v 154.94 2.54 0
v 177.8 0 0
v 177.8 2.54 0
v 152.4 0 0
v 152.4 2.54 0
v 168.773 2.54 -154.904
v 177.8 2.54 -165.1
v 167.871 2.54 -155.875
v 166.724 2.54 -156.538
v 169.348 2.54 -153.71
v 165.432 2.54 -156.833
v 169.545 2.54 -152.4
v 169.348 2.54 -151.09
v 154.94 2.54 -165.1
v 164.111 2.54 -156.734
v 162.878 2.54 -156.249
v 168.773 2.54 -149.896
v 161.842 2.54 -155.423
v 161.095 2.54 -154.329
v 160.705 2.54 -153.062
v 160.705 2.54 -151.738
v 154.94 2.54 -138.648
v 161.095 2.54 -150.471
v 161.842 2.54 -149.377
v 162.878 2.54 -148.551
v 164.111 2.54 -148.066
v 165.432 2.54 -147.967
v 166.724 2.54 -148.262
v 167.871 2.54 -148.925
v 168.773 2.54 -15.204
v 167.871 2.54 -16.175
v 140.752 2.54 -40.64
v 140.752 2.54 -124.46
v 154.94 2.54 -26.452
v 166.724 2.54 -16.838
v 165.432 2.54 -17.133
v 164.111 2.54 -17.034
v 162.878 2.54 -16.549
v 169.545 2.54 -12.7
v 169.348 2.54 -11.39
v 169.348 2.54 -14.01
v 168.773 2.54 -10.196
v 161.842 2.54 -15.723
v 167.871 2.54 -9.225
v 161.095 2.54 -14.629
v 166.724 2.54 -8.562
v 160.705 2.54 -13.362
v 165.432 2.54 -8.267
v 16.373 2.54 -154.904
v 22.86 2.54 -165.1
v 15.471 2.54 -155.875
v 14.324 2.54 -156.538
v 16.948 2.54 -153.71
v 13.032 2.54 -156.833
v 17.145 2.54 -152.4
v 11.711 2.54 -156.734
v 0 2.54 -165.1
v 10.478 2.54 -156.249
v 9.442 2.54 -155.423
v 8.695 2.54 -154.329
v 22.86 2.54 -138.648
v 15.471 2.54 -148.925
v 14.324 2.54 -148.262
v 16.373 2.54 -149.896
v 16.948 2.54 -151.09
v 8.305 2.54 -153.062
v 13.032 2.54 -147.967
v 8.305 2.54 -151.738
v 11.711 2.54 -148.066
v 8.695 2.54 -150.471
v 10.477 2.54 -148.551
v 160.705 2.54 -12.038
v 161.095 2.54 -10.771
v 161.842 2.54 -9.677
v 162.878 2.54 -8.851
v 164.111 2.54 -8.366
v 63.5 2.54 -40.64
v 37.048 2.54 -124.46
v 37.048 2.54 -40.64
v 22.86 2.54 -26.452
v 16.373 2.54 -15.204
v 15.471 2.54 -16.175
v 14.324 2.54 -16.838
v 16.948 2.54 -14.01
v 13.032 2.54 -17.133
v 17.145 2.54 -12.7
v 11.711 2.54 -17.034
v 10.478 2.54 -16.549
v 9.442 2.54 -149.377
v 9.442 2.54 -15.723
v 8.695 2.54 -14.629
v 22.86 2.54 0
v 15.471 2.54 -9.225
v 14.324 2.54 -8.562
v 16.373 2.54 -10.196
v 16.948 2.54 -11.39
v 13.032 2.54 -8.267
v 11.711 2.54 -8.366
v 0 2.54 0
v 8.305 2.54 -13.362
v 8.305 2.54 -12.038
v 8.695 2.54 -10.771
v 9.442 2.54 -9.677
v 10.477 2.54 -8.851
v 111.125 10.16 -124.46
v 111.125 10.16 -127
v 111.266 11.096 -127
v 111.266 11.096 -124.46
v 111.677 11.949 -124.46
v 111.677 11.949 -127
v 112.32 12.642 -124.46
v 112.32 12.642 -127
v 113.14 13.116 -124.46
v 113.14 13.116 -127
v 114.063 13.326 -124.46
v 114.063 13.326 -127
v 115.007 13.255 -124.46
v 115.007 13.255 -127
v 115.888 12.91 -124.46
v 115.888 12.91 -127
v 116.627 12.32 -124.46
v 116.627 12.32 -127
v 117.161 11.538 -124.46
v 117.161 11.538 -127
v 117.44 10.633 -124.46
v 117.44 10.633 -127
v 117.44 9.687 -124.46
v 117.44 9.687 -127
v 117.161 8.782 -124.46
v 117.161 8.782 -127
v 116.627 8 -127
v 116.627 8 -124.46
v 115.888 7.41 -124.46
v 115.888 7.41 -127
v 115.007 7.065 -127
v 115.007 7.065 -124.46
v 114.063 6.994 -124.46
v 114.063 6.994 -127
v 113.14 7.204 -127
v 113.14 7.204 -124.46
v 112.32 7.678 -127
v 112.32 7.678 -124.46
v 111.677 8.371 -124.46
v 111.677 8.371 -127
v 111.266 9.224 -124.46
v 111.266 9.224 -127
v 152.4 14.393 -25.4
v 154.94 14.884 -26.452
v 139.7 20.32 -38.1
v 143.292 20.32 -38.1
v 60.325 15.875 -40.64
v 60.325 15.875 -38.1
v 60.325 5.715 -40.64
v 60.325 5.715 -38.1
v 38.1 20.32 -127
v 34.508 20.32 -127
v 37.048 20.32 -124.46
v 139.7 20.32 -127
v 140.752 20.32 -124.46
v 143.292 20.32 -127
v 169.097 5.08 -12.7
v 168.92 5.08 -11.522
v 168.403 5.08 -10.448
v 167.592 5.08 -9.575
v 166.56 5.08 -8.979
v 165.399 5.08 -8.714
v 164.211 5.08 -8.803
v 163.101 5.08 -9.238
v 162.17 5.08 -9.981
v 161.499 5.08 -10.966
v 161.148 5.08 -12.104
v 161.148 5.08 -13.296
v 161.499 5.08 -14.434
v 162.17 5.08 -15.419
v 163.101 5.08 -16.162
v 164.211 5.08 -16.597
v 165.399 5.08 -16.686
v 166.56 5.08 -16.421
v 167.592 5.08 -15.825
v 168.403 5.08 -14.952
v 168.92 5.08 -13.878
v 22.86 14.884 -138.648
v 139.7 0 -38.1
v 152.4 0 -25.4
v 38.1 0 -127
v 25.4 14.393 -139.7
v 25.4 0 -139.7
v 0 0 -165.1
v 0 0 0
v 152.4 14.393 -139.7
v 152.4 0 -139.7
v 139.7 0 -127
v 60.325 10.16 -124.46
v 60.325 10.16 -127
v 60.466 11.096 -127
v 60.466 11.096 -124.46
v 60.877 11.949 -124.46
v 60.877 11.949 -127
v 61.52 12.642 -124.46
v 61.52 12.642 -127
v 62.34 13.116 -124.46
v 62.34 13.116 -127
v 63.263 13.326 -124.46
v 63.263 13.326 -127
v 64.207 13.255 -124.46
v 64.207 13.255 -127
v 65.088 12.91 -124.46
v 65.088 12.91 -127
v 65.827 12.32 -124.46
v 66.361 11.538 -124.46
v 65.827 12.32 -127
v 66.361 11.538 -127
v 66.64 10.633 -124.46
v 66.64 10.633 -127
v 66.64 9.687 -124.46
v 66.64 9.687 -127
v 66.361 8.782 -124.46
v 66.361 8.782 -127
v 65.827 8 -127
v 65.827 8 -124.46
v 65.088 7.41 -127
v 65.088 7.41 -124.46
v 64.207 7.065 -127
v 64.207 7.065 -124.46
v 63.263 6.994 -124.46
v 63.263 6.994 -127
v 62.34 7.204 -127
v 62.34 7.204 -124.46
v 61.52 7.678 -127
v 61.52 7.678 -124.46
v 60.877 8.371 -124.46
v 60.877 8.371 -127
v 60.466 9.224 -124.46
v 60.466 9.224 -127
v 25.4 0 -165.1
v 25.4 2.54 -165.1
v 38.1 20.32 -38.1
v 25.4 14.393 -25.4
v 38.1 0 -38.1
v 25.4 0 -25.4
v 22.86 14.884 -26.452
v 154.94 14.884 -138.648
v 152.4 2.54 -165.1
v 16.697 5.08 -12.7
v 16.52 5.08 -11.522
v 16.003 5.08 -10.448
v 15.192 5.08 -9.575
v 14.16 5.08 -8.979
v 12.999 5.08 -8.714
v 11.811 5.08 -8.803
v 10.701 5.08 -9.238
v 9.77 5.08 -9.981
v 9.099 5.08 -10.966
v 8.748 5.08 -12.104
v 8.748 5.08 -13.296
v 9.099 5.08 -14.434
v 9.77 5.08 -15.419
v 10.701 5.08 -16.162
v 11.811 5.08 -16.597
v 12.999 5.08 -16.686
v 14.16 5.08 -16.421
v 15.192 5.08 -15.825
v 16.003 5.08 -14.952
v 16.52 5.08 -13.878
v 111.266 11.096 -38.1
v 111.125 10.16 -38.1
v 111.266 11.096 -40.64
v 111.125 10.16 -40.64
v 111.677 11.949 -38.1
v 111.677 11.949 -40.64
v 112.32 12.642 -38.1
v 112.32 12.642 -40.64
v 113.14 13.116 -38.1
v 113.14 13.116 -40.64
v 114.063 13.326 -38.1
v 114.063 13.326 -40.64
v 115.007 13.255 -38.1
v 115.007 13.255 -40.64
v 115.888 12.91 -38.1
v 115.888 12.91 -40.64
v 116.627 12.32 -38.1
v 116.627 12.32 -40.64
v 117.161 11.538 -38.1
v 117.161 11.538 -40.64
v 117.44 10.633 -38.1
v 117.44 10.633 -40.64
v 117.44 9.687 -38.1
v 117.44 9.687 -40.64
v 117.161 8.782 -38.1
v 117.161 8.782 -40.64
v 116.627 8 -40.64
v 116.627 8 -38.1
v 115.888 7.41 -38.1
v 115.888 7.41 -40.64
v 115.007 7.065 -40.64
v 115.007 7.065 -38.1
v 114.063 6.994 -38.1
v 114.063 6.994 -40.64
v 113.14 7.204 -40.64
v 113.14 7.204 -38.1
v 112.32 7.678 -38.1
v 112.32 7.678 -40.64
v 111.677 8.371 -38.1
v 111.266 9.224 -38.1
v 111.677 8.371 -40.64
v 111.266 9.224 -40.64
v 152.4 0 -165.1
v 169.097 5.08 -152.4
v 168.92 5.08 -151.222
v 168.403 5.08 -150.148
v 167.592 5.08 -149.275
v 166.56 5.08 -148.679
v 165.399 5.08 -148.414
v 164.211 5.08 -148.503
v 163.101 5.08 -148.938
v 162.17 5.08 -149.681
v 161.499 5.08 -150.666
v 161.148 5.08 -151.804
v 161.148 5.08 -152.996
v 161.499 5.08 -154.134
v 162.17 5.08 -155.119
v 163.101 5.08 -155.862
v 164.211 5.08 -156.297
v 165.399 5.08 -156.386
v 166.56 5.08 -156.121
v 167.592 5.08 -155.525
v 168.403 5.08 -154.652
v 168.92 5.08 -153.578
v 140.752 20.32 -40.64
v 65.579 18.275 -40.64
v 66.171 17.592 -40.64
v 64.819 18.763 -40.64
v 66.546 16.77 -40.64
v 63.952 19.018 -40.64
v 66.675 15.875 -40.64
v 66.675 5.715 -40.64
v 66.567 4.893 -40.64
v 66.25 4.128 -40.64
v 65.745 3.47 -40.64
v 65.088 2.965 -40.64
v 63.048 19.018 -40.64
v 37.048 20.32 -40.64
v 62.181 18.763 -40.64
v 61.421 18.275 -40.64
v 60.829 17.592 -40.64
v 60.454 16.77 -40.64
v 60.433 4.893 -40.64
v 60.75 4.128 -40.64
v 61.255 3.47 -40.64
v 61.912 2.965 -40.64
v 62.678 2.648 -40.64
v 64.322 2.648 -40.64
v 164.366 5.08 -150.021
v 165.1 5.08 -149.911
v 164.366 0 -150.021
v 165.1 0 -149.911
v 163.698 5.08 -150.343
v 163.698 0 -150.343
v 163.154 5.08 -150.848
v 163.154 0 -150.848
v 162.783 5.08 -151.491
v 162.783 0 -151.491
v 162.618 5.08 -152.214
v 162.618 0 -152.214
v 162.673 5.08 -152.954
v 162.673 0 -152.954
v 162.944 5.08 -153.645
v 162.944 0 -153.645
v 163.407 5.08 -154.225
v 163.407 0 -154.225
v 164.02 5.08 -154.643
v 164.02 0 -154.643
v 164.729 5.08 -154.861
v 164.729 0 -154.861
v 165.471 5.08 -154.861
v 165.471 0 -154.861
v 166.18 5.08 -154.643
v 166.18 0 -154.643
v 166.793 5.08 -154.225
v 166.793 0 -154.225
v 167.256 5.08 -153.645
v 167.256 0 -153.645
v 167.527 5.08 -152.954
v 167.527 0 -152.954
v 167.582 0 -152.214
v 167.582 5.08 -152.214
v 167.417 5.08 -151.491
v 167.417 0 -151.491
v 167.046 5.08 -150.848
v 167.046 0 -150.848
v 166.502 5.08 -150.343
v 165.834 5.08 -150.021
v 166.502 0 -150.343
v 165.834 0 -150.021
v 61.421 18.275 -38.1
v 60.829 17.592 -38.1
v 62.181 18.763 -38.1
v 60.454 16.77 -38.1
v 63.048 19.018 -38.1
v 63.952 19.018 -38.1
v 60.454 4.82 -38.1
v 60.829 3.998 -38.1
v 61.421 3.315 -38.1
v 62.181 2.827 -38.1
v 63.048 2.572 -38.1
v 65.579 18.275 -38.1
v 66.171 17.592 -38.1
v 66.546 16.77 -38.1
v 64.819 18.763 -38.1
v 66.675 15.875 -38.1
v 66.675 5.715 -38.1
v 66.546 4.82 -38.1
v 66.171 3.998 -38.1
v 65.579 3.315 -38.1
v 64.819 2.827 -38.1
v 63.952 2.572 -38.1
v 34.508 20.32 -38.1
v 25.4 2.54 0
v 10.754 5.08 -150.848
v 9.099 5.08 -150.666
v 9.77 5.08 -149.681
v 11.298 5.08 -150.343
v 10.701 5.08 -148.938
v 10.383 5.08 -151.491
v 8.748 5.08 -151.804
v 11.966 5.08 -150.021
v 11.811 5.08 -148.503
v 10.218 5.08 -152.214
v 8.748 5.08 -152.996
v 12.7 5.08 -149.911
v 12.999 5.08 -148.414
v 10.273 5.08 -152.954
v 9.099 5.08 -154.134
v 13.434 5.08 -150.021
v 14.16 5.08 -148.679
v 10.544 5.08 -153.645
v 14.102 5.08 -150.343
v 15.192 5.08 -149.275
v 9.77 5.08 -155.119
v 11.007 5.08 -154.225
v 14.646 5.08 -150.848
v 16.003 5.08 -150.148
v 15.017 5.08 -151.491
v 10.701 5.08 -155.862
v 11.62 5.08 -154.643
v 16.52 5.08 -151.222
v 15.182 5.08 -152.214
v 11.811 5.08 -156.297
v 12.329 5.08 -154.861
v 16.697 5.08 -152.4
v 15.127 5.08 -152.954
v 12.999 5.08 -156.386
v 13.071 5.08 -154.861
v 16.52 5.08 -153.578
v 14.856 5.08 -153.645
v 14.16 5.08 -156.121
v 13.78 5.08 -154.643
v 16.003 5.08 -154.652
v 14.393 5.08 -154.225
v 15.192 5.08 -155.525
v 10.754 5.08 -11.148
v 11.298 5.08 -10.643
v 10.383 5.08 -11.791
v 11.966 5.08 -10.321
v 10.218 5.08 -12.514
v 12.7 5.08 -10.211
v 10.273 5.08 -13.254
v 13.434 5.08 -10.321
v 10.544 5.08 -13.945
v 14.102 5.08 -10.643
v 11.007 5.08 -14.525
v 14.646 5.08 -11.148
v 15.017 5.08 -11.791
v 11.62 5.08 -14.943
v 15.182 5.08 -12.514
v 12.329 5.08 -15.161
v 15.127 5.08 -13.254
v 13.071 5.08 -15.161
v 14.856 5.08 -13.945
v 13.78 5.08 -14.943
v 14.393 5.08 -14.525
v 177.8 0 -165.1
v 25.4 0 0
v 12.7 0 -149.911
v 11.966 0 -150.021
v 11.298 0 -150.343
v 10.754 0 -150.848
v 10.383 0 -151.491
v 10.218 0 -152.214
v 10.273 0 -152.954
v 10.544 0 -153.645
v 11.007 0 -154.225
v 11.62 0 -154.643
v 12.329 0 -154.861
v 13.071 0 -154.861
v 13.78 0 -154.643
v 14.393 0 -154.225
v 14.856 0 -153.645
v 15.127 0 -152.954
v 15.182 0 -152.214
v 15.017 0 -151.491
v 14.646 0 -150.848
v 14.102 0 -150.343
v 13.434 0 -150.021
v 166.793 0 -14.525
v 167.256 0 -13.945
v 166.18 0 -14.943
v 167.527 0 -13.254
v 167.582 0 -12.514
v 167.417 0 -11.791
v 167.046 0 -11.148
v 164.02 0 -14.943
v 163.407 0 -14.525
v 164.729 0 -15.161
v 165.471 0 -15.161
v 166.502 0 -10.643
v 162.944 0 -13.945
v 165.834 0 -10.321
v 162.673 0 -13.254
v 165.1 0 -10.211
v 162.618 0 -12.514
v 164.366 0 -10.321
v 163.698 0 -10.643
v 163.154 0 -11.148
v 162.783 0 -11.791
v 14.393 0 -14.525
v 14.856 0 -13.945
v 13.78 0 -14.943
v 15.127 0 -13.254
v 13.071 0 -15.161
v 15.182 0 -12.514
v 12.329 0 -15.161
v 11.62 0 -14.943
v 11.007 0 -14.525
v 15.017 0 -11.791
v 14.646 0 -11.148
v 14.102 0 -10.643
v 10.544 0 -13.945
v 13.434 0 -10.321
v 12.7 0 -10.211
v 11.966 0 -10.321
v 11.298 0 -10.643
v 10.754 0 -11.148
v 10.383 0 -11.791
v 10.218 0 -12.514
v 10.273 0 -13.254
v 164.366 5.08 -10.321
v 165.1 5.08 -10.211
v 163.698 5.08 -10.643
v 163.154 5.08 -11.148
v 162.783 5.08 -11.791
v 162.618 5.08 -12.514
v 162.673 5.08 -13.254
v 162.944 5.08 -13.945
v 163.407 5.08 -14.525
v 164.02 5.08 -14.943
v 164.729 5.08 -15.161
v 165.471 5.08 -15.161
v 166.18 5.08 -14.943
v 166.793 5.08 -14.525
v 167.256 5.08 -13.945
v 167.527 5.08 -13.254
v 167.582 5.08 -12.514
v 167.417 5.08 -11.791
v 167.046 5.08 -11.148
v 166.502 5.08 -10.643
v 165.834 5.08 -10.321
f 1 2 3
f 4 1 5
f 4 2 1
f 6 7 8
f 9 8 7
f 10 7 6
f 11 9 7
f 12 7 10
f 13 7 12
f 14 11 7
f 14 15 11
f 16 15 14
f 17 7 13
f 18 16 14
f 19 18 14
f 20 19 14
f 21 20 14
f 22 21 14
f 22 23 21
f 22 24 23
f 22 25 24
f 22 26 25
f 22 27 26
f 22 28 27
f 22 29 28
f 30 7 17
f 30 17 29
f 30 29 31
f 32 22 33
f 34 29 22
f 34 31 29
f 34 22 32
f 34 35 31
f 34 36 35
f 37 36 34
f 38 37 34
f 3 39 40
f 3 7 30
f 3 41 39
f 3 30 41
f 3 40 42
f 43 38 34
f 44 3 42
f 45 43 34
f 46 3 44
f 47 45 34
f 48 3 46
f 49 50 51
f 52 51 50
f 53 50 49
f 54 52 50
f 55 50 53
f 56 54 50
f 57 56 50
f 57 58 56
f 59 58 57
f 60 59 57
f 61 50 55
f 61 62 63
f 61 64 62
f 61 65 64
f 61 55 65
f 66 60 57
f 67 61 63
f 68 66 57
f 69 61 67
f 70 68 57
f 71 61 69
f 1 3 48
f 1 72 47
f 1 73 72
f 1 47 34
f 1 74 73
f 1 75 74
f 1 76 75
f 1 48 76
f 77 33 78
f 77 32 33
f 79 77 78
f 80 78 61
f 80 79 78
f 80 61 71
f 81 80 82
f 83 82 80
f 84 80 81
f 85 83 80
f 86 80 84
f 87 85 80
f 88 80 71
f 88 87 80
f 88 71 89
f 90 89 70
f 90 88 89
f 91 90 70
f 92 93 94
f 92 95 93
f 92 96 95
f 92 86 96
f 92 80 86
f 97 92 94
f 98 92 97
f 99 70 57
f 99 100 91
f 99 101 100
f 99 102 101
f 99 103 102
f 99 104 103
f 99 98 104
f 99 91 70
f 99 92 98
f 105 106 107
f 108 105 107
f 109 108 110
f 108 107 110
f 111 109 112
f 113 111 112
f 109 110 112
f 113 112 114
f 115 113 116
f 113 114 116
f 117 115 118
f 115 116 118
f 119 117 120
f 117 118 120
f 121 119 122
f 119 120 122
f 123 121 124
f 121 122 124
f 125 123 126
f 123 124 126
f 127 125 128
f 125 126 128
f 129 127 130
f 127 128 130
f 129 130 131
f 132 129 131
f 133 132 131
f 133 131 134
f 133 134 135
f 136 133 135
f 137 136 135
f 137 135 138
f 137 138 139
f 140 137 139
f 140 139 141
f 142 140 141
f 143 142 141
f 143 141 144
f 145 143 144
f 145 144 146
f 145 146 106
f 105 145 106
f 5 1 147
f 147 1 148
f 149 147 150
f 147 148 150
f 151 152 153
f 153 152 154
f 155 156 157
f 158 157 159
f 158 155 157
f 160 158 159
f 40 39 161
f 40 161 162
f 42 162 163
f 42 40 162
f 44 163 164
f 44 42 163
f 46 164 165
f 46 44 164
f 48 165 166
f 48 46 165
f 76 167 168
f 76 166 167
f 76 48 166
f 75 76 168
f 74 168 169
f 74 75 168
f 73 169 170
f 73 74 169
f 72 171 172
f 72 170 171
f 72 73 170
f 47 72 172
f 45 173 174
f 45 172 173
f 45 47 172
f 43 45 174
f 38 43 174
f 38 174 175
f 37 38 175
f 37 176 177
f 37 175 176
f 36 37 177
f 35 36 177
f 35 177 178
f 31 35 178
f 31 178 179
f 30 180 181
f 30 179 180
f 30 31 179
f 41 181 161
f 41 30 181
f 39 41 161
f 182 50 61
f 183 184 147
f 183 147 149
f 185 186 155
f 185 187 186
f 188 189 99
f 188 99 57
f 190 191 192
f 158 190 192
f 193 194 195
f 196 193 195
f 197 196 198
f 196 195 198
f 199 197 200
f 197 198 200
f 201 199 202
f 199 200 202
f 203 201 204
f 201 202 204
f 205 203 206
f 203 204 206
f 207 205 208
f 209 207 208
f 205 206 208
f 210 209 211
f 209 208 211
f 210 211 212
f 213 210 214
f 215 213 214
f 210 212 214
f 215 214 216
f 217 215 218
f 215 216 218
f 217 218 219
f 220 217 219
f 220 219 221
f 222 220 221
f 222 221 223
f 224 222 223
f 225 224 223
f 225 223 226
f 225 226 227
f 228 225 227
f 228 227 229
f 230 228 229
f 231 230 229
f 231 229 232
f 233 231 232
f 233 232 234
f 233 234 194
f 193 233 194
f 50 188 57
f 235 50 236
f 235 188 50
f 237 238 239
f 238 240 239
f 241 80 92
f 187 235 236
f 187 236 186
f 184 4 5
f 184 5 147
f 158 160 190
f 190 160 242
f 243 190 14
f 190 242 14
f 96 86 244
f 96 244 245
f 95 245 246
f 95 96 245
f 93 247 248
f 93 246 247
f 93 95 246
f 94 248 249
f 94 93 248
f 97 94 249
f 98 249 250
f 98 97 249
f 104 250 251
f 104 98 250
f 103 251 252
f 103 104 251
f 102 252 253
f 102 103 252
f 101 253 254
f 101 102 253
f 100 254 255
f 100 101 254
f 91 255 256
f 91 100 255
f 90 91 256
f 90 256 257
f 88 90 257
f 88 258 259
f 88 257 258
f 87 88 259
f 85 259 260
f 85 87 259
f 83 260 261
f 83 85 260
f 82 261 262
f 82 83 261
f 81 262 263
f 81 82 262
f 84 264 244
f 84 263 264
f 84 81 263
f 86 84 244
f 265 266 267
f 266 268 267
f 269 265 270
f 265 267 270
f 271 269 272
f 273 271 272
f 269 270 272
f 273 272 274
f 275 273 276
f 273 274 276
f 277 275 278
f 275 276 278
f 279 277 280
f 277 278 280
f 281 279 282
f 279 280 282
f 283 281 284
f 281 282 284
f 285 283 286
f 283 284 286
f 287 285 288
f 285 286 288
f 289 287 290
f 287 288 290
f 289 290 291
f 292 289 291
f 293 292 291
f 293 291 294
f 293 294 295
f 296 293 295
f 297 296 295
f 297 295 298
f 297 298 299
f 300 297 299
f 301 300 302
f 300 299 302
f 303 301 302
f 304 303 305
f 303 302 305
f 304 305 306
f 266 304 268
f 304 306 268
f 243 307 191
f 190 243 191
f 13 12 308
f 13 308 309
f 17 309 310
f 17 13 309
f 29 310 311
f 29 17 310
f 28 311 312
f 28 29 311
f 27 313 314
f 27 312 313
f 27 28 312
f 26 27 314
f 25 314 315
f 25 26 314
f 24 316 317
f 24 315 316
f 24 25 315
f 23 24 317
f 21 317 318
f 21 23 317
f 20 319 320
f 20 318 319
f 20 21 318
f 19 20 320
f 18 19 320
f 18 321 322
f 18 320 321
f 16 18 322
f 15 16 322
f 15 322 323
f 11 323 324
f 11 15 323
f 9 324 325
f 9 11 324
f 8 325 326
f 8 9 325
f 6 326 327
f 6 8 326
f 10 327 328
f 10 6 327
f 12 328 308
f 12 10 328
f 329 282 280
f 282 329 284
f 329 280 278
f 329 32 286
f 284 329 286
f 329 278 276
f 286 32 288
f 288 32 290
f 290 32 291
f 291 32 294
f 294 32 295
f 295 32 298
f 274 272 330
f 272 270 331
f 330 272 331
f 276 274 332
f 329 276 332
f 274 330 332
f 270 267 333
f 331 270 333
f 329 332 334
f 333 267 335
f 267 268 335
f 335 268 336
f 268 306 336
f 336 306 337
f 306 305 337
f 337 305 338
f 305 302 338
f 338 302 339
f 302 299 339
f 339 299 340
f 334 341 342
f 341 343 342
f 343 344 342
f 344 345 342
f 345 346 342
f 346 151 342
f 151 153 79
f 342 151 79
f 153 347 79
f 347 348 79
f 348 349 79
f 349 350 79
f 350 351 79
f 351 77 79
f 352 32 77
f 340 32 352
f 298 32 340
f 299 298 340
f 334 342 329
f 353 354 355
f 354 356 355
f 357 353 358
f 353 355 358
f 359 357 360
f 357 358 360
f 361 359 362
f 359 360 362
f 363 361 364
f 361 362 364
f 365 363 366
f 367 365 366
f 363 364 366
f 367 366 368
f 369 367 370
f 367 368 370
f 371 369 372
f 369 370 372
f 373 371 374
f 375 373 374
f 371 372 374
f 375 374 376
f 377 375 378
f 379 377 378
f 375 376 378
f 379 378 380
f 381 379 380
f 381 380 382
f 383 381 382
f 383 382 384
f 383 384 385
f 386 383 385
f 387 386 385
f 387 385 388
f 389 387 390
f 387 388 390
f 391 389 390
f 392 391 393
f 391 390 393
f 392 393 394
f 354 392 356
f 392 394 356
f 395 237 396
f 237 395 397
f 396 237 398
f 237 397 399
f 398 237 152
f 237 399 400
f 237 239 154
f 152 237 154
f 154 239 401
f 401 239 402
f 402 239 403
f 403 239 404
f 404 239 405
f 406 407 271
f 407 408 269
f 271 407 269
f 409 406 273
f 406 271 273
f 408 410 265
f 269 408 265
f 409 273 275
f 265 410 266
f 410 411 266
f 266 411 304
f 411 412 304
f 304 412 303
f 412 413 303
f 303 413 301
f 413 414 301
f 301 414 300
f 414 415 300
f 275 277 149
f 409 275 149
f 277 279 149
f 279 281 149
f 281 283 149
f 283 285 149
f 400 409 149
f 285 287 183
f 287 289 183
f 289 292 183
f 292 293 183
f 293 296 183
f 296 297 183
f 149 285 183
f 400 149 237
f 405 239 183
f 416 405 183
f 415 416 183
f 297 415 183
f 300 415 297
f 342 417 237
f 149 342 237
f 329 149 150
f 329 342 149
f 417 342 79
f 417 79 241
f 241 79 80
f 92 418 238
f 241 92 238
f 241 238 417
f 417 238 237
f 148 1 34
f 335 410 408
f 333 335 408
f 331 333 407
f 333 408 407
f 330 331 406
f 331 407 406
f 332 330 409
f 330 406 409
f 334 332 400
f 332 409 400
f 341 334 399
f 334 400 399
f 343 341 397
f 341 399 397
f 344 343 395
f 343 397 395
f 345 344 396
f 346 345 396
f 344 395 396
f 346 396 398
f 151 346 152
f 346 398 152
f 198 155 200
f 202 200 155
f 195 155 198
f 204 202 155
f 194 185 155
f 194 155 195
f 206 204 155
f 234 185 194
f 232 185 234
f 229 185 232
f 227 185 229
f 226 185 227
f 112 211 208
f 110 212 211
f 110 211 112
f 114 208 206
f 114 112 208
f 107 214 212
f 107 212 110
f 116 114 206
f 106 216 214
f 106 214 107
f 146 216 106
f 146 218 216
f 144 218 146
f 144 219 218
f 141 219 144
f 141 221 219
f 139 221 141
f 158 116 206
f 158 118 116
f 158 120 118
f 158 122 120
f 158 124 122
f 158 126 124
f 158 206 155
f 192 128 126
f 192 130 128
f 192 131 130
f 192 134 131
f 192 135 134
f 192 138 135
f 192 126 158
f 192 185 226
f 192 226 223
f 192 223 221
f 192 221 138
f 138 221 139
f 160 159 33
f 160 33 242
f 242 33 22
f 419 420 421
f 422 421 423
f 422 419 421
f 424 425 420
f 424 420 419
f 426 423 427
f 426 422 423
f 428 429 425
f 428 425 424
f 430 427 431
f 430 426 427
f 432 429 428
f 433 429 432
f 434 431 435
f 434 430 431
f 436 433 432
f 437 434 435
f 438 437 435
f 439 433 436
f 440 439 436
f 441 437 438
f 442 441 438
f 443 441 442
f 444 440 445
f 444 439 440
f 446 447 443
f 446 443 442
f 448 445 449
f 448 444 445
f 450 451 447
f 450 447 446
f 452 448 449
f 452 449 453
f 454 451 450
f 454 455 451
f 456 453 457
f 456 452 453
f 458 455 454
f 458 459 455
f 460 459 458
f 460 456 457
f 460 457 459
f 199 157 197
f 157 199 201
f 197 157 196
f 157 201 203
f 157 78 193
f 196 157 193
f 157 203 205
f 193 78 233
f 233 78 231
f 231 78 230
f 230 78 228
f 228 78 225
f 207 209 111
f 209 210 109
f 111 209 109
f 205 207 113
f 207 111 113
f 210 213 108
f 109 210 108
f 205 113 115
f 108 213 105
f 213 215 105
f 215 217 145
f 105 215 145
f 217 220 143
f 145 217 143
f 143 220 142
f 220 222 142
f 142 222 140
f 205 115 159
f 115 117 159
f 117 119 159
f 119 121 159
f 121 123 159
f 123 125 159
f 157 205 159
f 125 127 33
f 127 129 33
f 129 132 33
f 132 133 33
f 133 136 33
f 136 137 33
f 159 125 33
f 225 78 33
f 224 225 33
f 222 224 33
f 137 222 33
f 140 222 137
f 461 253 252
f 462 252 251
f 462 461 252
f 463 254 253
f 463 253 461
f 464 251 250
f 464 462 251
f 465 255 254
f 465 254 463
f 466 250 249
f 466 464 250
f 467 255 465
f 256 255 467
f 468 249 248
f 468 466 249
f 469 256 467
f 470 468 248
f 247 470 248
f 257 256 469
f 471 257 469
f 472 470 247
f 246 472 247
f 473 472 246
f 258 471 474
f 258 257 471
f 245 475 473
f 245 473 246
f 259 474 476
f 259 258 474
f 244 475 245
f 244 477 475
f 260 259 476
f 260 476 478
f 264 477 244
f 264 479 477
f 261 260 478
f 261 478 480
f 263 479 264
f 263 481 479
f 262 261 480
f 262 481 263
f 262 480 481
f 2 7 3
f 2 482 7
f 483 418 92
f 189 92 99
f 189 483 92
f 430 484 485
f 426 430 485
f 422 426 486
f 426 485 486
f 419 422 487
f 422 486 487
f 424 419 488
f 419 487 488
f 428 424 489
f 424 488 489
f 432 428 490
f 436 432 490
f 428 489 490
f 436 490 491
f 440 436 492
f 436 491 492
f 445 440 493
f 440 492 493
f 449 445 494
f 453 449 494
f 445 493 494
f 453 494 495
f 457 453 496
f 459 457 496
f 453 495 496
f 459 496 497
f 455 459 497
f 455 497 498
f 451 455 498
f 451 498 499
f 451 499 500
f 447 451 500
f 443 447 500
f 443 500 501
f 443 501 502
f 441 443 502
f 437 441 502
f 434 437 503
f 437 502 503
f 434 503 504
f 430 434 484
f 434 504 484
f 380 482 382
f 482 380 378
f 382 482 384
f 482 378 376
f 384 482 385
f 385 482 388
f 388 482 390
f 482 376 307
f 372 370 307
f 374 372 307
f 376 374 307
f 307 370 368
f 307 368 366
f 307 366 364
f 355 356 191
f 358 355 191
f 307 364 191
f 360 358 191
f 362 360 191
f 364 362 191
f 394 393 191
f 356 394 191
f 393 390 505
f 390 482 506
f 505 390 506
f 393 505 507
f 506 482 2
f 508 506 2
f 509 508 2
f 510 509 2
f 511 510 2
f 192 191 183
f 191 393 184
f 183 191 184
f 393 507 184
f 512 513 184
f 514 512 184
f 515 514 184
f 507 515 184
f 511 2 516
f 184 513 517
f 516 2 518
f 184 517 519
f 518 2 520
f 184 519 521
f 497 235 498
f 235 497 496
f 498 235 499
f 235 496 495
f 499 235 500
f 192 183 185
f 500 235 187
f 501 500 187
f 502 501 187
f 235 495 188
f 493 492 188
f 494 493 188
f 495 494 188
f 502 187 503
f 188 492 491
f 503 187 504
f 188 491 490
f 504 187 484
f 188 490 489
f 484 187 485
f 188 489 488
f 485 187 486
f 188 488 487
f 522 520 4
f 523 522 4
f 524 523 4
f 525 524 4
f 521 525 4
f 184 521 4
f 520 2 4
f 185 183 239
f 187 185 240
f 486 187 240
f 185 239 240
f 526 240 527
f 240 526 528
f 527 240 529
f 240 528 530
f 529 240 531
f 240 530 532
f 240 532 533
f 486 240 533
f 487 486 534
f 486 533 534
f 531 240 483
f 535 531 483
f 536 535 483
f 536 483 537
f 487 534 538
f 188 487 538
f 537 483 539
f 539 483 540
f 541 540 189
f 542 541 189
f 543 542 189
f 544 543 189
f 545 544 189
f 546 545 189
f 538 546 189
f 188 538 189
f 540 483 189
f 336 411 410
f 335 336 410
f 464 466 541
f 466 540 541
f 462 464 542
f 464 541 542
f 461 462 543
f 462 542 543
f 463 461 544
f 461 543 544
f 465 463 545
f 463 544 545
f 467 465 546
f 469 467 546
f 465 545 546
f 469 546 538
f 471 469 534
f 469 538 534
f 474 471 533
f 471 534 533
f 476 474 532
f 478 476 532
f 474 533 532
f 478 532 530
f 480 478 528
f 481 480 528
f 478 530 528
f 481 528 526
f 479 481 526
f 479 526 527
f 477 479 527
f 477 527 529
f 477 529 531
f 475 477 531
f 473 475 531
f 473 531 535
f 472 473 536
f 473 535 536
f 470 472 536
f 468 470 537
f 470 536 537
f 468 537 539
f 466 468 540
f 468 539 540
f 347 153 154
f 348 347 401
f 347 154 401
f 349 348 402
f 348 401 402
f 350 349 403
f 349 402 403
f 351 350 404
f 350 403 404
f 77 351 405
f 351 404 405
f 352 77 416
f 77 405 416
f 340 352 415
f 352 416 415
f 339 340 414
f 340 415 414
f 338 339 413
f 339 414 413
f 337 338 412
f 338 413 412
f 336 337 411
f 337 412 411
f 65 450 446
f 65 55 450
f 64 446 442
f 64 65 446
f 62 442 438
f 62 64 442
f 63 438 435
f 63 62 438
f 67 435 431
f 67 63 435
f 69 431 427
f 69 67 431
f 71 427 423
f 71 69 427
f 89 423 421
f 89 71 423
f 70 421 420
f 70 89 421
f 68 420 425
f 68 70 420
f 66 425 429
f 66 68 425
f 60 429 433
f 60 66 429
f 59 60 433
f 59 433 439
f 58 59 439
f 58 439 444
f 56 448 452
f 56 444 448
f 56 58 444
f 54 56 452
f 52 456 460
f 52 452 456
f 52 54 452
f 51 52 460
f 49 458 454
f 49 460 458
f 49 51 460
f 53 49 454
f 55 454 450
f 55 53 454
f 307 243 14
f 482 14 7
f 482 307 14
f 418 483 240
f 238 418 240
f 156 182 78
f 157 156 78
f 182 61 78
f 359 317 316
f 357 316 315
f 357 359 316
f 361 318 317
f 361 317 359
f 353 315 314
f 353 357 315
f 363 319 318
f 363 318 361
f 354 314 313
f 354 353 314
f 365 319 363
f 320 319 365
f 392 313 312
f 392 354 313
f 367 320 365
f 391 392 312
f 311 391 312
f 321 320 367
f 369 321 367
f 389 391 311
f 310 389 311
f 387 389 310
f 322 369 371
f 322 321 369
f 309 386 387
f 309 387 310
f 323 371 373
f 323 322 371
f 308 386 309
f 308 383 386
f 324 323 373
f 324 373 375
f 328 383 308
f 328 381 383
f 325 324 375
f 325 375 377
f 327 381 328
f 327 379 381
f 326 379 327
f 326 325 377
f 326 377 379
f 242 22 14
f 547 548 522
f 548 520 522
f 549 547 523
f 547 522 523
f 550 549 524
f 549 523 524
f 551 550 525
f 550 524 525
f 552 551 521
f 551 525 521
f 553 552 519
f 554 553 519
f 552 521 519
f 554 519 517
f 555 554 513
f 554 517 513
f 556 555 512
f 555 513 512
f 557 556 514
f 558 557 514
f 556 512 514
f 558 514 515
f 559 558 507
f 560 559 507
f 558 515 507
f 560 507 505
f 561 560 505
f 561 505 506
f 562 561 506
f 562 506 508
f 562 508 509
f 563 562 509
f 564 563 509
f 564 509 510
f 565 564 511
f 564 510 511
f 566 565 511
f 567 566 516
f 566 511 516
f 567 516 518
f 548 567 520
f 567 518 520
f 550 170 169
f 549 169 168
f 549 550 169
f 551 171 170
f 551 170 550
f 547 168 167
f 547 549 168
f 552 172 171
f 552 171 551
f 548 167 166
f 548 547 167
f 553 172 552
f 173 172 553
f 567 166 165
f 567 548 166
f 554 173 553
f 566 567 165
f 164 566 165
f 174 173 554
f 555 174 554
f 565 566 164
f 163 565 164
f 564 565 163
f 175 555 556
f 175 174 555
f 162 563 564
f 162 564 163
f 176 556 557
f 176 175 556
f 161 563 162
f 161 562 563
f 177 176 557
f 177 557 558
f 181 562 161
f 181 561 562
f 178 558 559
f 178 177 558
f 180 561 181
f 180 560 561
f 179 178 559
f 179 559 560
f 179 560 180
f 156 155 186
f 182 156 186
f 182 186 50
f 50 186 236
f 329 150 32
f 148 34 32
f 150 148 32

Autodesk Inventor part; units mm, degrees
ref_plane "YZ Plane" through (0, 0, 0) normal (1, 0, 0) x (0, 1, 0)
ref_plane "XZ Plane" through (0, 0, 0) normal (0, 1, 0) x (-1, 0, 0)
ref_plane "XY Plane" through (0, 0, 0) normal (0, 0, 1) x (1, 0, 0)
sketch "Sketch1" plane through (0, 0, 0) normal (0, 1, 0) x (-1, 0, 0)
  line L0 (0, 0) -> (0, -165.1)
  line L1 (0, -165.1) -> (-177.8, -165.1)
  line L2 (-177.8, -165.1) -> (-177.8, 0)
  line L3 (-177.8, 0) -> (0, 0)
  line L4 (0, 0) -> (-25.4, 0)
  line L5 (-177.8, 0) -> (-152.4, 0)
  line L6 (0, -165.1) -> (-25.4, -165.1)
  line L7 (-177.8, -165.1) -> (-152.4, -165.1)
  line L8 (-152.4, 0) -> (-152.4, -25.4)
  line L9 (-152.4, -165.1) -> (-152.4, -139.7)
  line L10 (-25.4, 0) -> (-25.4, -25.4)
  line L11 (-25.4, -165.1) -> (-25.4, -139.7)
  line L12 (-38.1, -38.1) -> (-139.7, -38.1)
  line L13 (-25.4, -25.4) -> (-38.1, -38.1)
  line L14 (-25.4, -25.4) -> (-7.439488, -25.4) construction
  line L15 (-152.4, -25.4) -> (-139.7, -38.1)
  line L16 (-177.8, -82.55) -> (0, -82.55)
  line L17 (-152.4, -165.1) -> (-152.4, -139.7)
  line L18 (-25.4, -165.1) -> (-25.4, -139.7)
  line L19 (-38.1, -127) -> (-139.7, -127)
  line L20 (-25.4, -139.7) -> (-38.1, -127)
  line L21 (-152.4, -139.7) -> (-139.7, -127)
  dimension "d1" = 165.1
  dimension "d2" = 177.8
  dimension "d3" = 25.4
  dimension "d4" = 25.4
  dimension "d6" = 25.4
  dimension "d7" = 25.4
  dimension "d10" = 25.4
  dimension "d11" = 25.4
  dimension "d12" = 25.4
  dimension "d13" = 25.4
  dimension "d16" = 101.6
  dimension "d17" = 135
  dimension "d18" = 135
extrude "Extrusion1" add sketch "Sketch1" along normal blind 2.54 contours L0 L16 L2 L3 L8 L15 L12 L13 L10 | L0 L1 L11 L20 L19 L21 L9 L2 L16
sketch "Sketch2" plane through (0, 2.54, 0) normal (0, 1, 0) x (1, 0, 0)
  line L0 (25.4, 139.7) -> (25.4, 165.1)
  line L1 (25.4, 165.1) -> (0, 165.1)
  line L2 (0, 165.1) -> (0, 0)
  line L3 (0, 0) -> (25.4, 0)
  line L4 (25.4, 0) -> (25.4, 25.4)
  line L5 (25.4, 25.4) -> (38.1, 38.1)
  line L6 (38.1, 38.1) -> (139.7, 38.1)
  line L7 (139.7, 38.1) -> (152.4, 25.4)
  line L8 (152.4, 25.4) -> (152.4, 0)
  line L9 (152.4, 0) -> (177.8, 0)
  line L10 (177.8, 0) -> (177.8, 165.1)
  line L11 (177.8, 165.1) -> (152.4, 165.1)
  line L12 (152.4, 165.1) -> (152.4, 139.7)
  line L13 (152.4, 139.7) -> (139.7, 127)
  line L14 (139.7, 127) -> (38.1, 127)
  line L15 (38.1, 127) -> (25.4, 139.7)
  line L16 (2.54, 2.54) -> (2.54, 162.56)
  line L17 (2.54, 162.56) -> (22.86, 162.56)
  line L18 (22.86, 162.56) -> (22.86, 138.647898)
  line L19 (22.86, 138.647898) -> (37.047898, 124.46)
  line L20 (37.047898, 124.46) -> (140.752102, 124.46)
  line L21 (140.752102, 124.46) -> (154.94, 138.647898)
  line L22 (154.94, 138.647898) -> (154.94, 162.56)
  line L23 (154.94, 162.56) -> (175.26, 162.56)
  line L24 (175.26, 162.56) -> (175.26, 2.54)
  line L25 (175.26, 2.54) -> (154.94, 2.54)
  line L26 (154.94, 2.54) -> (154.94, 26.452102)
  line L27 (154.94, 26.452102) -> (140.752102, 40.64)
  line L28 (140.752102, 40.64) -> (37.047898, 40.64)
  line L29 (37.047898, 40.64) -> (22.86, 26.452102)
  line L30 (22.86, 26.452102) -> (22.86, 2.54)
  line L31 (22.86, 2.54) -> (2.54, 2.54)
  line L32 (22.86, 2.54) -> (22.86, 0)
  line L33 (154.94, 2.54) -> (154.94, 0)
  line L34 (154.94, 162.56) -> (154.94, 165.1)
  line L35 (22.86, 162.56) -> (22.86, 165.1)
  dimension "d21" = 2.54
extrude "Extrusion2" add sketch "Sketch2" along normal blind 17.78 contours L15 L14 L13 L12 L11 L34 L22 L21 L20 L19 L18 L35 L1 L0 | L32 L30 L29 L28 L27 L26 L33 L9 L8 L7 L6 L5 L4 L3
sketch "Sketch3" plane through (154.94, 2.54, 0) normal (1, 0, 0) x (0, 0, -1)
  line L0 (165.1, 0) -> (0, 0)
  line L1 (26.452102, 0) -> (26.452102, 17.78)
  line L2 (0, 17.78) -> (0, 0)
  line L3 (38.1, -2.54) -> (38.1, 17.78)
  line L4 (0, 0) -> (38.1, 17.78)
  line L5 (38.1, 17.78) -> (0, 17.78)
  line L6 (165.1, -2.54) -> (165.1, 17.78)
  line L7 (165.1, 0) -> (165.1, 17.78)
  line L8 (127, -2.54) -> (127, 17.78)
  line L9 (165.1, 17.78) -> (127, 17.78)
  line L10 (127, 17.78) -> (165.1, 0)
  point P0 (0, -2.54)
  dimension "d24" = 17.78
extrude "Extrusion3" cut sketch "Sketch3" against normal blind 132.08 contours L2 L5 L1 L4 | L1 L5 L4 | L10 L9 L6
sketch "Sketch4" plane through (0, 2.54, 0) normal (0, 1, 0) x (1, 0, 0)
  line L0 (0, 0) -> (0, 25.4)
  line L1 (0, 165.1) -> (0, 0) projected
  line L2 (0, 25.4) -> (25.4, 25.4)
  line L3 (0, 0) -> (25.4, 0) projected
  line L4 (25.4, 25.4) -> (0, 0)
  line L5 (0, 25.4) -> (25.4, 0)
  circle A0 centre (12.7, 12.7) radius 4.445
  dimension "d27" = 25.4
  dimension "d28" = 25.4
  dimension "d29" = 8.89
sketch "Sketch4 outline for Extrusion4" plane through (0, 2.54, 0) normal (0, 1, 0) x (1, 0, 0)
  circle A0 centre (12.7, 12.7) radius 4.445
extrude "Extrusion4" add sketch "Sketch4 outline for Extrusion4" along normal blind 2.54 draft -10
sketch "Sketch5" plane through (12.7, 5.08, -12.7) normal (0, 1, 0) x (1, 0, 0)
  circle A0 centre (0, 0) radius 3.997129
  line L0 (0, -3.997129) -> (0, 3.997129)
  line L1 (3.997129, 0) -> (-3.997129, 0)
  point P0 (-12.7, -12.7)
  dimension "d32" = 7.99426
  dimension "d33" = 7.99426
hole "Hole1" at (12.7, 5.08, -12.7) direction (0, -1, 0) diameter 4.9784 end through all thread size "1/4-20 UNC" class "2B" standard "ANSI Unified Screw Threads"
pattern_linear "Rectangular Pattern1" count 2 spacing 139.7 along (0, 0, -1) count 2 spacing 152.4 along (1, 0, 0) of "Hole1", "Extrusion4"
sketch "Sketch6" plane through (139.7, 0, -127) normal (0, 0, -1) x (-1, 0, 0)
  line L0 (101.6, 0) -> (101.6, 20.32) projected
  line L1 (0, 0) -> (0, 20.32) projected
  line L2 (101.6, 0) -> (0, 20.32)
  line L3 (0, 20.32) -> (0, 0)
  line L4 (0, 0) -> (101.6, 20.32)
  line L5 (50.8, 10.16) -> (76.2, 10.16)
  line L6 (50.8, 10.16) -> (25.4, 10.16)
  circle A0 centre (76.2, 10.16) radius 3.175
  circle A1 centre (25.4, 10.16) radius 3.175
  point P0 (139.7, 0)
  dimension "d48" = 101.6
  dimension "d49" = 22.6199
  dimension "d51" = 25.4
  dimension "d52" = 25.4
  dimension "d53" = 6.35
  dimension "d54" = 6.35
extrude "Extrusion5" cut sketch "Sketch6" against normal blind 88.9 contours A0 | A1
sketch "Sketch7" plane through (38.1, 0, -38.1) normal (0, 0, 1) x (1, 0, 0)
  circle A0 centre (25.4, 10.16) radius 3.175 projected
  line L0 (25.4, 10.16) -> (22.225, 10.16)
  line L1 (22.225, 10.16) -> (22.225, 5.715)
  line L2 (22.225, 5.715) -> (25.4, 5.715)
  circle A1 centre (25.4, 5.715) radius 3.175
  line L3 (28.575, 5.715) -> (28.575, 15.875)
  line L4 (28.575, 15.875) -> (25.4, 15.875)
  circle A2 centre (25.4, 15.875) radius 3.175
  line L5 (22.225, 10.16) -> (22.225, 15.875)
  line L6 (25.4, 0) -> (25.4, 2.54)
  point P0 (-38.1, 0)
  point P1 (22.225, 13.0175)
  dimension "d58" = 6.35
  dimension "d57" = 4.445
  dimension "d60" = 6.35
  dimension "d61" = 6.35
  dimension "d62" = 5.715
  dimension "d63" = 2.54
  dimension "d64" = 3.175
  dimension "d65" = 13.335
extrude "Extrusion6" cut sketch "Sketch7" against normal blind 2.54
properties part number "ChairBaseBracket"
